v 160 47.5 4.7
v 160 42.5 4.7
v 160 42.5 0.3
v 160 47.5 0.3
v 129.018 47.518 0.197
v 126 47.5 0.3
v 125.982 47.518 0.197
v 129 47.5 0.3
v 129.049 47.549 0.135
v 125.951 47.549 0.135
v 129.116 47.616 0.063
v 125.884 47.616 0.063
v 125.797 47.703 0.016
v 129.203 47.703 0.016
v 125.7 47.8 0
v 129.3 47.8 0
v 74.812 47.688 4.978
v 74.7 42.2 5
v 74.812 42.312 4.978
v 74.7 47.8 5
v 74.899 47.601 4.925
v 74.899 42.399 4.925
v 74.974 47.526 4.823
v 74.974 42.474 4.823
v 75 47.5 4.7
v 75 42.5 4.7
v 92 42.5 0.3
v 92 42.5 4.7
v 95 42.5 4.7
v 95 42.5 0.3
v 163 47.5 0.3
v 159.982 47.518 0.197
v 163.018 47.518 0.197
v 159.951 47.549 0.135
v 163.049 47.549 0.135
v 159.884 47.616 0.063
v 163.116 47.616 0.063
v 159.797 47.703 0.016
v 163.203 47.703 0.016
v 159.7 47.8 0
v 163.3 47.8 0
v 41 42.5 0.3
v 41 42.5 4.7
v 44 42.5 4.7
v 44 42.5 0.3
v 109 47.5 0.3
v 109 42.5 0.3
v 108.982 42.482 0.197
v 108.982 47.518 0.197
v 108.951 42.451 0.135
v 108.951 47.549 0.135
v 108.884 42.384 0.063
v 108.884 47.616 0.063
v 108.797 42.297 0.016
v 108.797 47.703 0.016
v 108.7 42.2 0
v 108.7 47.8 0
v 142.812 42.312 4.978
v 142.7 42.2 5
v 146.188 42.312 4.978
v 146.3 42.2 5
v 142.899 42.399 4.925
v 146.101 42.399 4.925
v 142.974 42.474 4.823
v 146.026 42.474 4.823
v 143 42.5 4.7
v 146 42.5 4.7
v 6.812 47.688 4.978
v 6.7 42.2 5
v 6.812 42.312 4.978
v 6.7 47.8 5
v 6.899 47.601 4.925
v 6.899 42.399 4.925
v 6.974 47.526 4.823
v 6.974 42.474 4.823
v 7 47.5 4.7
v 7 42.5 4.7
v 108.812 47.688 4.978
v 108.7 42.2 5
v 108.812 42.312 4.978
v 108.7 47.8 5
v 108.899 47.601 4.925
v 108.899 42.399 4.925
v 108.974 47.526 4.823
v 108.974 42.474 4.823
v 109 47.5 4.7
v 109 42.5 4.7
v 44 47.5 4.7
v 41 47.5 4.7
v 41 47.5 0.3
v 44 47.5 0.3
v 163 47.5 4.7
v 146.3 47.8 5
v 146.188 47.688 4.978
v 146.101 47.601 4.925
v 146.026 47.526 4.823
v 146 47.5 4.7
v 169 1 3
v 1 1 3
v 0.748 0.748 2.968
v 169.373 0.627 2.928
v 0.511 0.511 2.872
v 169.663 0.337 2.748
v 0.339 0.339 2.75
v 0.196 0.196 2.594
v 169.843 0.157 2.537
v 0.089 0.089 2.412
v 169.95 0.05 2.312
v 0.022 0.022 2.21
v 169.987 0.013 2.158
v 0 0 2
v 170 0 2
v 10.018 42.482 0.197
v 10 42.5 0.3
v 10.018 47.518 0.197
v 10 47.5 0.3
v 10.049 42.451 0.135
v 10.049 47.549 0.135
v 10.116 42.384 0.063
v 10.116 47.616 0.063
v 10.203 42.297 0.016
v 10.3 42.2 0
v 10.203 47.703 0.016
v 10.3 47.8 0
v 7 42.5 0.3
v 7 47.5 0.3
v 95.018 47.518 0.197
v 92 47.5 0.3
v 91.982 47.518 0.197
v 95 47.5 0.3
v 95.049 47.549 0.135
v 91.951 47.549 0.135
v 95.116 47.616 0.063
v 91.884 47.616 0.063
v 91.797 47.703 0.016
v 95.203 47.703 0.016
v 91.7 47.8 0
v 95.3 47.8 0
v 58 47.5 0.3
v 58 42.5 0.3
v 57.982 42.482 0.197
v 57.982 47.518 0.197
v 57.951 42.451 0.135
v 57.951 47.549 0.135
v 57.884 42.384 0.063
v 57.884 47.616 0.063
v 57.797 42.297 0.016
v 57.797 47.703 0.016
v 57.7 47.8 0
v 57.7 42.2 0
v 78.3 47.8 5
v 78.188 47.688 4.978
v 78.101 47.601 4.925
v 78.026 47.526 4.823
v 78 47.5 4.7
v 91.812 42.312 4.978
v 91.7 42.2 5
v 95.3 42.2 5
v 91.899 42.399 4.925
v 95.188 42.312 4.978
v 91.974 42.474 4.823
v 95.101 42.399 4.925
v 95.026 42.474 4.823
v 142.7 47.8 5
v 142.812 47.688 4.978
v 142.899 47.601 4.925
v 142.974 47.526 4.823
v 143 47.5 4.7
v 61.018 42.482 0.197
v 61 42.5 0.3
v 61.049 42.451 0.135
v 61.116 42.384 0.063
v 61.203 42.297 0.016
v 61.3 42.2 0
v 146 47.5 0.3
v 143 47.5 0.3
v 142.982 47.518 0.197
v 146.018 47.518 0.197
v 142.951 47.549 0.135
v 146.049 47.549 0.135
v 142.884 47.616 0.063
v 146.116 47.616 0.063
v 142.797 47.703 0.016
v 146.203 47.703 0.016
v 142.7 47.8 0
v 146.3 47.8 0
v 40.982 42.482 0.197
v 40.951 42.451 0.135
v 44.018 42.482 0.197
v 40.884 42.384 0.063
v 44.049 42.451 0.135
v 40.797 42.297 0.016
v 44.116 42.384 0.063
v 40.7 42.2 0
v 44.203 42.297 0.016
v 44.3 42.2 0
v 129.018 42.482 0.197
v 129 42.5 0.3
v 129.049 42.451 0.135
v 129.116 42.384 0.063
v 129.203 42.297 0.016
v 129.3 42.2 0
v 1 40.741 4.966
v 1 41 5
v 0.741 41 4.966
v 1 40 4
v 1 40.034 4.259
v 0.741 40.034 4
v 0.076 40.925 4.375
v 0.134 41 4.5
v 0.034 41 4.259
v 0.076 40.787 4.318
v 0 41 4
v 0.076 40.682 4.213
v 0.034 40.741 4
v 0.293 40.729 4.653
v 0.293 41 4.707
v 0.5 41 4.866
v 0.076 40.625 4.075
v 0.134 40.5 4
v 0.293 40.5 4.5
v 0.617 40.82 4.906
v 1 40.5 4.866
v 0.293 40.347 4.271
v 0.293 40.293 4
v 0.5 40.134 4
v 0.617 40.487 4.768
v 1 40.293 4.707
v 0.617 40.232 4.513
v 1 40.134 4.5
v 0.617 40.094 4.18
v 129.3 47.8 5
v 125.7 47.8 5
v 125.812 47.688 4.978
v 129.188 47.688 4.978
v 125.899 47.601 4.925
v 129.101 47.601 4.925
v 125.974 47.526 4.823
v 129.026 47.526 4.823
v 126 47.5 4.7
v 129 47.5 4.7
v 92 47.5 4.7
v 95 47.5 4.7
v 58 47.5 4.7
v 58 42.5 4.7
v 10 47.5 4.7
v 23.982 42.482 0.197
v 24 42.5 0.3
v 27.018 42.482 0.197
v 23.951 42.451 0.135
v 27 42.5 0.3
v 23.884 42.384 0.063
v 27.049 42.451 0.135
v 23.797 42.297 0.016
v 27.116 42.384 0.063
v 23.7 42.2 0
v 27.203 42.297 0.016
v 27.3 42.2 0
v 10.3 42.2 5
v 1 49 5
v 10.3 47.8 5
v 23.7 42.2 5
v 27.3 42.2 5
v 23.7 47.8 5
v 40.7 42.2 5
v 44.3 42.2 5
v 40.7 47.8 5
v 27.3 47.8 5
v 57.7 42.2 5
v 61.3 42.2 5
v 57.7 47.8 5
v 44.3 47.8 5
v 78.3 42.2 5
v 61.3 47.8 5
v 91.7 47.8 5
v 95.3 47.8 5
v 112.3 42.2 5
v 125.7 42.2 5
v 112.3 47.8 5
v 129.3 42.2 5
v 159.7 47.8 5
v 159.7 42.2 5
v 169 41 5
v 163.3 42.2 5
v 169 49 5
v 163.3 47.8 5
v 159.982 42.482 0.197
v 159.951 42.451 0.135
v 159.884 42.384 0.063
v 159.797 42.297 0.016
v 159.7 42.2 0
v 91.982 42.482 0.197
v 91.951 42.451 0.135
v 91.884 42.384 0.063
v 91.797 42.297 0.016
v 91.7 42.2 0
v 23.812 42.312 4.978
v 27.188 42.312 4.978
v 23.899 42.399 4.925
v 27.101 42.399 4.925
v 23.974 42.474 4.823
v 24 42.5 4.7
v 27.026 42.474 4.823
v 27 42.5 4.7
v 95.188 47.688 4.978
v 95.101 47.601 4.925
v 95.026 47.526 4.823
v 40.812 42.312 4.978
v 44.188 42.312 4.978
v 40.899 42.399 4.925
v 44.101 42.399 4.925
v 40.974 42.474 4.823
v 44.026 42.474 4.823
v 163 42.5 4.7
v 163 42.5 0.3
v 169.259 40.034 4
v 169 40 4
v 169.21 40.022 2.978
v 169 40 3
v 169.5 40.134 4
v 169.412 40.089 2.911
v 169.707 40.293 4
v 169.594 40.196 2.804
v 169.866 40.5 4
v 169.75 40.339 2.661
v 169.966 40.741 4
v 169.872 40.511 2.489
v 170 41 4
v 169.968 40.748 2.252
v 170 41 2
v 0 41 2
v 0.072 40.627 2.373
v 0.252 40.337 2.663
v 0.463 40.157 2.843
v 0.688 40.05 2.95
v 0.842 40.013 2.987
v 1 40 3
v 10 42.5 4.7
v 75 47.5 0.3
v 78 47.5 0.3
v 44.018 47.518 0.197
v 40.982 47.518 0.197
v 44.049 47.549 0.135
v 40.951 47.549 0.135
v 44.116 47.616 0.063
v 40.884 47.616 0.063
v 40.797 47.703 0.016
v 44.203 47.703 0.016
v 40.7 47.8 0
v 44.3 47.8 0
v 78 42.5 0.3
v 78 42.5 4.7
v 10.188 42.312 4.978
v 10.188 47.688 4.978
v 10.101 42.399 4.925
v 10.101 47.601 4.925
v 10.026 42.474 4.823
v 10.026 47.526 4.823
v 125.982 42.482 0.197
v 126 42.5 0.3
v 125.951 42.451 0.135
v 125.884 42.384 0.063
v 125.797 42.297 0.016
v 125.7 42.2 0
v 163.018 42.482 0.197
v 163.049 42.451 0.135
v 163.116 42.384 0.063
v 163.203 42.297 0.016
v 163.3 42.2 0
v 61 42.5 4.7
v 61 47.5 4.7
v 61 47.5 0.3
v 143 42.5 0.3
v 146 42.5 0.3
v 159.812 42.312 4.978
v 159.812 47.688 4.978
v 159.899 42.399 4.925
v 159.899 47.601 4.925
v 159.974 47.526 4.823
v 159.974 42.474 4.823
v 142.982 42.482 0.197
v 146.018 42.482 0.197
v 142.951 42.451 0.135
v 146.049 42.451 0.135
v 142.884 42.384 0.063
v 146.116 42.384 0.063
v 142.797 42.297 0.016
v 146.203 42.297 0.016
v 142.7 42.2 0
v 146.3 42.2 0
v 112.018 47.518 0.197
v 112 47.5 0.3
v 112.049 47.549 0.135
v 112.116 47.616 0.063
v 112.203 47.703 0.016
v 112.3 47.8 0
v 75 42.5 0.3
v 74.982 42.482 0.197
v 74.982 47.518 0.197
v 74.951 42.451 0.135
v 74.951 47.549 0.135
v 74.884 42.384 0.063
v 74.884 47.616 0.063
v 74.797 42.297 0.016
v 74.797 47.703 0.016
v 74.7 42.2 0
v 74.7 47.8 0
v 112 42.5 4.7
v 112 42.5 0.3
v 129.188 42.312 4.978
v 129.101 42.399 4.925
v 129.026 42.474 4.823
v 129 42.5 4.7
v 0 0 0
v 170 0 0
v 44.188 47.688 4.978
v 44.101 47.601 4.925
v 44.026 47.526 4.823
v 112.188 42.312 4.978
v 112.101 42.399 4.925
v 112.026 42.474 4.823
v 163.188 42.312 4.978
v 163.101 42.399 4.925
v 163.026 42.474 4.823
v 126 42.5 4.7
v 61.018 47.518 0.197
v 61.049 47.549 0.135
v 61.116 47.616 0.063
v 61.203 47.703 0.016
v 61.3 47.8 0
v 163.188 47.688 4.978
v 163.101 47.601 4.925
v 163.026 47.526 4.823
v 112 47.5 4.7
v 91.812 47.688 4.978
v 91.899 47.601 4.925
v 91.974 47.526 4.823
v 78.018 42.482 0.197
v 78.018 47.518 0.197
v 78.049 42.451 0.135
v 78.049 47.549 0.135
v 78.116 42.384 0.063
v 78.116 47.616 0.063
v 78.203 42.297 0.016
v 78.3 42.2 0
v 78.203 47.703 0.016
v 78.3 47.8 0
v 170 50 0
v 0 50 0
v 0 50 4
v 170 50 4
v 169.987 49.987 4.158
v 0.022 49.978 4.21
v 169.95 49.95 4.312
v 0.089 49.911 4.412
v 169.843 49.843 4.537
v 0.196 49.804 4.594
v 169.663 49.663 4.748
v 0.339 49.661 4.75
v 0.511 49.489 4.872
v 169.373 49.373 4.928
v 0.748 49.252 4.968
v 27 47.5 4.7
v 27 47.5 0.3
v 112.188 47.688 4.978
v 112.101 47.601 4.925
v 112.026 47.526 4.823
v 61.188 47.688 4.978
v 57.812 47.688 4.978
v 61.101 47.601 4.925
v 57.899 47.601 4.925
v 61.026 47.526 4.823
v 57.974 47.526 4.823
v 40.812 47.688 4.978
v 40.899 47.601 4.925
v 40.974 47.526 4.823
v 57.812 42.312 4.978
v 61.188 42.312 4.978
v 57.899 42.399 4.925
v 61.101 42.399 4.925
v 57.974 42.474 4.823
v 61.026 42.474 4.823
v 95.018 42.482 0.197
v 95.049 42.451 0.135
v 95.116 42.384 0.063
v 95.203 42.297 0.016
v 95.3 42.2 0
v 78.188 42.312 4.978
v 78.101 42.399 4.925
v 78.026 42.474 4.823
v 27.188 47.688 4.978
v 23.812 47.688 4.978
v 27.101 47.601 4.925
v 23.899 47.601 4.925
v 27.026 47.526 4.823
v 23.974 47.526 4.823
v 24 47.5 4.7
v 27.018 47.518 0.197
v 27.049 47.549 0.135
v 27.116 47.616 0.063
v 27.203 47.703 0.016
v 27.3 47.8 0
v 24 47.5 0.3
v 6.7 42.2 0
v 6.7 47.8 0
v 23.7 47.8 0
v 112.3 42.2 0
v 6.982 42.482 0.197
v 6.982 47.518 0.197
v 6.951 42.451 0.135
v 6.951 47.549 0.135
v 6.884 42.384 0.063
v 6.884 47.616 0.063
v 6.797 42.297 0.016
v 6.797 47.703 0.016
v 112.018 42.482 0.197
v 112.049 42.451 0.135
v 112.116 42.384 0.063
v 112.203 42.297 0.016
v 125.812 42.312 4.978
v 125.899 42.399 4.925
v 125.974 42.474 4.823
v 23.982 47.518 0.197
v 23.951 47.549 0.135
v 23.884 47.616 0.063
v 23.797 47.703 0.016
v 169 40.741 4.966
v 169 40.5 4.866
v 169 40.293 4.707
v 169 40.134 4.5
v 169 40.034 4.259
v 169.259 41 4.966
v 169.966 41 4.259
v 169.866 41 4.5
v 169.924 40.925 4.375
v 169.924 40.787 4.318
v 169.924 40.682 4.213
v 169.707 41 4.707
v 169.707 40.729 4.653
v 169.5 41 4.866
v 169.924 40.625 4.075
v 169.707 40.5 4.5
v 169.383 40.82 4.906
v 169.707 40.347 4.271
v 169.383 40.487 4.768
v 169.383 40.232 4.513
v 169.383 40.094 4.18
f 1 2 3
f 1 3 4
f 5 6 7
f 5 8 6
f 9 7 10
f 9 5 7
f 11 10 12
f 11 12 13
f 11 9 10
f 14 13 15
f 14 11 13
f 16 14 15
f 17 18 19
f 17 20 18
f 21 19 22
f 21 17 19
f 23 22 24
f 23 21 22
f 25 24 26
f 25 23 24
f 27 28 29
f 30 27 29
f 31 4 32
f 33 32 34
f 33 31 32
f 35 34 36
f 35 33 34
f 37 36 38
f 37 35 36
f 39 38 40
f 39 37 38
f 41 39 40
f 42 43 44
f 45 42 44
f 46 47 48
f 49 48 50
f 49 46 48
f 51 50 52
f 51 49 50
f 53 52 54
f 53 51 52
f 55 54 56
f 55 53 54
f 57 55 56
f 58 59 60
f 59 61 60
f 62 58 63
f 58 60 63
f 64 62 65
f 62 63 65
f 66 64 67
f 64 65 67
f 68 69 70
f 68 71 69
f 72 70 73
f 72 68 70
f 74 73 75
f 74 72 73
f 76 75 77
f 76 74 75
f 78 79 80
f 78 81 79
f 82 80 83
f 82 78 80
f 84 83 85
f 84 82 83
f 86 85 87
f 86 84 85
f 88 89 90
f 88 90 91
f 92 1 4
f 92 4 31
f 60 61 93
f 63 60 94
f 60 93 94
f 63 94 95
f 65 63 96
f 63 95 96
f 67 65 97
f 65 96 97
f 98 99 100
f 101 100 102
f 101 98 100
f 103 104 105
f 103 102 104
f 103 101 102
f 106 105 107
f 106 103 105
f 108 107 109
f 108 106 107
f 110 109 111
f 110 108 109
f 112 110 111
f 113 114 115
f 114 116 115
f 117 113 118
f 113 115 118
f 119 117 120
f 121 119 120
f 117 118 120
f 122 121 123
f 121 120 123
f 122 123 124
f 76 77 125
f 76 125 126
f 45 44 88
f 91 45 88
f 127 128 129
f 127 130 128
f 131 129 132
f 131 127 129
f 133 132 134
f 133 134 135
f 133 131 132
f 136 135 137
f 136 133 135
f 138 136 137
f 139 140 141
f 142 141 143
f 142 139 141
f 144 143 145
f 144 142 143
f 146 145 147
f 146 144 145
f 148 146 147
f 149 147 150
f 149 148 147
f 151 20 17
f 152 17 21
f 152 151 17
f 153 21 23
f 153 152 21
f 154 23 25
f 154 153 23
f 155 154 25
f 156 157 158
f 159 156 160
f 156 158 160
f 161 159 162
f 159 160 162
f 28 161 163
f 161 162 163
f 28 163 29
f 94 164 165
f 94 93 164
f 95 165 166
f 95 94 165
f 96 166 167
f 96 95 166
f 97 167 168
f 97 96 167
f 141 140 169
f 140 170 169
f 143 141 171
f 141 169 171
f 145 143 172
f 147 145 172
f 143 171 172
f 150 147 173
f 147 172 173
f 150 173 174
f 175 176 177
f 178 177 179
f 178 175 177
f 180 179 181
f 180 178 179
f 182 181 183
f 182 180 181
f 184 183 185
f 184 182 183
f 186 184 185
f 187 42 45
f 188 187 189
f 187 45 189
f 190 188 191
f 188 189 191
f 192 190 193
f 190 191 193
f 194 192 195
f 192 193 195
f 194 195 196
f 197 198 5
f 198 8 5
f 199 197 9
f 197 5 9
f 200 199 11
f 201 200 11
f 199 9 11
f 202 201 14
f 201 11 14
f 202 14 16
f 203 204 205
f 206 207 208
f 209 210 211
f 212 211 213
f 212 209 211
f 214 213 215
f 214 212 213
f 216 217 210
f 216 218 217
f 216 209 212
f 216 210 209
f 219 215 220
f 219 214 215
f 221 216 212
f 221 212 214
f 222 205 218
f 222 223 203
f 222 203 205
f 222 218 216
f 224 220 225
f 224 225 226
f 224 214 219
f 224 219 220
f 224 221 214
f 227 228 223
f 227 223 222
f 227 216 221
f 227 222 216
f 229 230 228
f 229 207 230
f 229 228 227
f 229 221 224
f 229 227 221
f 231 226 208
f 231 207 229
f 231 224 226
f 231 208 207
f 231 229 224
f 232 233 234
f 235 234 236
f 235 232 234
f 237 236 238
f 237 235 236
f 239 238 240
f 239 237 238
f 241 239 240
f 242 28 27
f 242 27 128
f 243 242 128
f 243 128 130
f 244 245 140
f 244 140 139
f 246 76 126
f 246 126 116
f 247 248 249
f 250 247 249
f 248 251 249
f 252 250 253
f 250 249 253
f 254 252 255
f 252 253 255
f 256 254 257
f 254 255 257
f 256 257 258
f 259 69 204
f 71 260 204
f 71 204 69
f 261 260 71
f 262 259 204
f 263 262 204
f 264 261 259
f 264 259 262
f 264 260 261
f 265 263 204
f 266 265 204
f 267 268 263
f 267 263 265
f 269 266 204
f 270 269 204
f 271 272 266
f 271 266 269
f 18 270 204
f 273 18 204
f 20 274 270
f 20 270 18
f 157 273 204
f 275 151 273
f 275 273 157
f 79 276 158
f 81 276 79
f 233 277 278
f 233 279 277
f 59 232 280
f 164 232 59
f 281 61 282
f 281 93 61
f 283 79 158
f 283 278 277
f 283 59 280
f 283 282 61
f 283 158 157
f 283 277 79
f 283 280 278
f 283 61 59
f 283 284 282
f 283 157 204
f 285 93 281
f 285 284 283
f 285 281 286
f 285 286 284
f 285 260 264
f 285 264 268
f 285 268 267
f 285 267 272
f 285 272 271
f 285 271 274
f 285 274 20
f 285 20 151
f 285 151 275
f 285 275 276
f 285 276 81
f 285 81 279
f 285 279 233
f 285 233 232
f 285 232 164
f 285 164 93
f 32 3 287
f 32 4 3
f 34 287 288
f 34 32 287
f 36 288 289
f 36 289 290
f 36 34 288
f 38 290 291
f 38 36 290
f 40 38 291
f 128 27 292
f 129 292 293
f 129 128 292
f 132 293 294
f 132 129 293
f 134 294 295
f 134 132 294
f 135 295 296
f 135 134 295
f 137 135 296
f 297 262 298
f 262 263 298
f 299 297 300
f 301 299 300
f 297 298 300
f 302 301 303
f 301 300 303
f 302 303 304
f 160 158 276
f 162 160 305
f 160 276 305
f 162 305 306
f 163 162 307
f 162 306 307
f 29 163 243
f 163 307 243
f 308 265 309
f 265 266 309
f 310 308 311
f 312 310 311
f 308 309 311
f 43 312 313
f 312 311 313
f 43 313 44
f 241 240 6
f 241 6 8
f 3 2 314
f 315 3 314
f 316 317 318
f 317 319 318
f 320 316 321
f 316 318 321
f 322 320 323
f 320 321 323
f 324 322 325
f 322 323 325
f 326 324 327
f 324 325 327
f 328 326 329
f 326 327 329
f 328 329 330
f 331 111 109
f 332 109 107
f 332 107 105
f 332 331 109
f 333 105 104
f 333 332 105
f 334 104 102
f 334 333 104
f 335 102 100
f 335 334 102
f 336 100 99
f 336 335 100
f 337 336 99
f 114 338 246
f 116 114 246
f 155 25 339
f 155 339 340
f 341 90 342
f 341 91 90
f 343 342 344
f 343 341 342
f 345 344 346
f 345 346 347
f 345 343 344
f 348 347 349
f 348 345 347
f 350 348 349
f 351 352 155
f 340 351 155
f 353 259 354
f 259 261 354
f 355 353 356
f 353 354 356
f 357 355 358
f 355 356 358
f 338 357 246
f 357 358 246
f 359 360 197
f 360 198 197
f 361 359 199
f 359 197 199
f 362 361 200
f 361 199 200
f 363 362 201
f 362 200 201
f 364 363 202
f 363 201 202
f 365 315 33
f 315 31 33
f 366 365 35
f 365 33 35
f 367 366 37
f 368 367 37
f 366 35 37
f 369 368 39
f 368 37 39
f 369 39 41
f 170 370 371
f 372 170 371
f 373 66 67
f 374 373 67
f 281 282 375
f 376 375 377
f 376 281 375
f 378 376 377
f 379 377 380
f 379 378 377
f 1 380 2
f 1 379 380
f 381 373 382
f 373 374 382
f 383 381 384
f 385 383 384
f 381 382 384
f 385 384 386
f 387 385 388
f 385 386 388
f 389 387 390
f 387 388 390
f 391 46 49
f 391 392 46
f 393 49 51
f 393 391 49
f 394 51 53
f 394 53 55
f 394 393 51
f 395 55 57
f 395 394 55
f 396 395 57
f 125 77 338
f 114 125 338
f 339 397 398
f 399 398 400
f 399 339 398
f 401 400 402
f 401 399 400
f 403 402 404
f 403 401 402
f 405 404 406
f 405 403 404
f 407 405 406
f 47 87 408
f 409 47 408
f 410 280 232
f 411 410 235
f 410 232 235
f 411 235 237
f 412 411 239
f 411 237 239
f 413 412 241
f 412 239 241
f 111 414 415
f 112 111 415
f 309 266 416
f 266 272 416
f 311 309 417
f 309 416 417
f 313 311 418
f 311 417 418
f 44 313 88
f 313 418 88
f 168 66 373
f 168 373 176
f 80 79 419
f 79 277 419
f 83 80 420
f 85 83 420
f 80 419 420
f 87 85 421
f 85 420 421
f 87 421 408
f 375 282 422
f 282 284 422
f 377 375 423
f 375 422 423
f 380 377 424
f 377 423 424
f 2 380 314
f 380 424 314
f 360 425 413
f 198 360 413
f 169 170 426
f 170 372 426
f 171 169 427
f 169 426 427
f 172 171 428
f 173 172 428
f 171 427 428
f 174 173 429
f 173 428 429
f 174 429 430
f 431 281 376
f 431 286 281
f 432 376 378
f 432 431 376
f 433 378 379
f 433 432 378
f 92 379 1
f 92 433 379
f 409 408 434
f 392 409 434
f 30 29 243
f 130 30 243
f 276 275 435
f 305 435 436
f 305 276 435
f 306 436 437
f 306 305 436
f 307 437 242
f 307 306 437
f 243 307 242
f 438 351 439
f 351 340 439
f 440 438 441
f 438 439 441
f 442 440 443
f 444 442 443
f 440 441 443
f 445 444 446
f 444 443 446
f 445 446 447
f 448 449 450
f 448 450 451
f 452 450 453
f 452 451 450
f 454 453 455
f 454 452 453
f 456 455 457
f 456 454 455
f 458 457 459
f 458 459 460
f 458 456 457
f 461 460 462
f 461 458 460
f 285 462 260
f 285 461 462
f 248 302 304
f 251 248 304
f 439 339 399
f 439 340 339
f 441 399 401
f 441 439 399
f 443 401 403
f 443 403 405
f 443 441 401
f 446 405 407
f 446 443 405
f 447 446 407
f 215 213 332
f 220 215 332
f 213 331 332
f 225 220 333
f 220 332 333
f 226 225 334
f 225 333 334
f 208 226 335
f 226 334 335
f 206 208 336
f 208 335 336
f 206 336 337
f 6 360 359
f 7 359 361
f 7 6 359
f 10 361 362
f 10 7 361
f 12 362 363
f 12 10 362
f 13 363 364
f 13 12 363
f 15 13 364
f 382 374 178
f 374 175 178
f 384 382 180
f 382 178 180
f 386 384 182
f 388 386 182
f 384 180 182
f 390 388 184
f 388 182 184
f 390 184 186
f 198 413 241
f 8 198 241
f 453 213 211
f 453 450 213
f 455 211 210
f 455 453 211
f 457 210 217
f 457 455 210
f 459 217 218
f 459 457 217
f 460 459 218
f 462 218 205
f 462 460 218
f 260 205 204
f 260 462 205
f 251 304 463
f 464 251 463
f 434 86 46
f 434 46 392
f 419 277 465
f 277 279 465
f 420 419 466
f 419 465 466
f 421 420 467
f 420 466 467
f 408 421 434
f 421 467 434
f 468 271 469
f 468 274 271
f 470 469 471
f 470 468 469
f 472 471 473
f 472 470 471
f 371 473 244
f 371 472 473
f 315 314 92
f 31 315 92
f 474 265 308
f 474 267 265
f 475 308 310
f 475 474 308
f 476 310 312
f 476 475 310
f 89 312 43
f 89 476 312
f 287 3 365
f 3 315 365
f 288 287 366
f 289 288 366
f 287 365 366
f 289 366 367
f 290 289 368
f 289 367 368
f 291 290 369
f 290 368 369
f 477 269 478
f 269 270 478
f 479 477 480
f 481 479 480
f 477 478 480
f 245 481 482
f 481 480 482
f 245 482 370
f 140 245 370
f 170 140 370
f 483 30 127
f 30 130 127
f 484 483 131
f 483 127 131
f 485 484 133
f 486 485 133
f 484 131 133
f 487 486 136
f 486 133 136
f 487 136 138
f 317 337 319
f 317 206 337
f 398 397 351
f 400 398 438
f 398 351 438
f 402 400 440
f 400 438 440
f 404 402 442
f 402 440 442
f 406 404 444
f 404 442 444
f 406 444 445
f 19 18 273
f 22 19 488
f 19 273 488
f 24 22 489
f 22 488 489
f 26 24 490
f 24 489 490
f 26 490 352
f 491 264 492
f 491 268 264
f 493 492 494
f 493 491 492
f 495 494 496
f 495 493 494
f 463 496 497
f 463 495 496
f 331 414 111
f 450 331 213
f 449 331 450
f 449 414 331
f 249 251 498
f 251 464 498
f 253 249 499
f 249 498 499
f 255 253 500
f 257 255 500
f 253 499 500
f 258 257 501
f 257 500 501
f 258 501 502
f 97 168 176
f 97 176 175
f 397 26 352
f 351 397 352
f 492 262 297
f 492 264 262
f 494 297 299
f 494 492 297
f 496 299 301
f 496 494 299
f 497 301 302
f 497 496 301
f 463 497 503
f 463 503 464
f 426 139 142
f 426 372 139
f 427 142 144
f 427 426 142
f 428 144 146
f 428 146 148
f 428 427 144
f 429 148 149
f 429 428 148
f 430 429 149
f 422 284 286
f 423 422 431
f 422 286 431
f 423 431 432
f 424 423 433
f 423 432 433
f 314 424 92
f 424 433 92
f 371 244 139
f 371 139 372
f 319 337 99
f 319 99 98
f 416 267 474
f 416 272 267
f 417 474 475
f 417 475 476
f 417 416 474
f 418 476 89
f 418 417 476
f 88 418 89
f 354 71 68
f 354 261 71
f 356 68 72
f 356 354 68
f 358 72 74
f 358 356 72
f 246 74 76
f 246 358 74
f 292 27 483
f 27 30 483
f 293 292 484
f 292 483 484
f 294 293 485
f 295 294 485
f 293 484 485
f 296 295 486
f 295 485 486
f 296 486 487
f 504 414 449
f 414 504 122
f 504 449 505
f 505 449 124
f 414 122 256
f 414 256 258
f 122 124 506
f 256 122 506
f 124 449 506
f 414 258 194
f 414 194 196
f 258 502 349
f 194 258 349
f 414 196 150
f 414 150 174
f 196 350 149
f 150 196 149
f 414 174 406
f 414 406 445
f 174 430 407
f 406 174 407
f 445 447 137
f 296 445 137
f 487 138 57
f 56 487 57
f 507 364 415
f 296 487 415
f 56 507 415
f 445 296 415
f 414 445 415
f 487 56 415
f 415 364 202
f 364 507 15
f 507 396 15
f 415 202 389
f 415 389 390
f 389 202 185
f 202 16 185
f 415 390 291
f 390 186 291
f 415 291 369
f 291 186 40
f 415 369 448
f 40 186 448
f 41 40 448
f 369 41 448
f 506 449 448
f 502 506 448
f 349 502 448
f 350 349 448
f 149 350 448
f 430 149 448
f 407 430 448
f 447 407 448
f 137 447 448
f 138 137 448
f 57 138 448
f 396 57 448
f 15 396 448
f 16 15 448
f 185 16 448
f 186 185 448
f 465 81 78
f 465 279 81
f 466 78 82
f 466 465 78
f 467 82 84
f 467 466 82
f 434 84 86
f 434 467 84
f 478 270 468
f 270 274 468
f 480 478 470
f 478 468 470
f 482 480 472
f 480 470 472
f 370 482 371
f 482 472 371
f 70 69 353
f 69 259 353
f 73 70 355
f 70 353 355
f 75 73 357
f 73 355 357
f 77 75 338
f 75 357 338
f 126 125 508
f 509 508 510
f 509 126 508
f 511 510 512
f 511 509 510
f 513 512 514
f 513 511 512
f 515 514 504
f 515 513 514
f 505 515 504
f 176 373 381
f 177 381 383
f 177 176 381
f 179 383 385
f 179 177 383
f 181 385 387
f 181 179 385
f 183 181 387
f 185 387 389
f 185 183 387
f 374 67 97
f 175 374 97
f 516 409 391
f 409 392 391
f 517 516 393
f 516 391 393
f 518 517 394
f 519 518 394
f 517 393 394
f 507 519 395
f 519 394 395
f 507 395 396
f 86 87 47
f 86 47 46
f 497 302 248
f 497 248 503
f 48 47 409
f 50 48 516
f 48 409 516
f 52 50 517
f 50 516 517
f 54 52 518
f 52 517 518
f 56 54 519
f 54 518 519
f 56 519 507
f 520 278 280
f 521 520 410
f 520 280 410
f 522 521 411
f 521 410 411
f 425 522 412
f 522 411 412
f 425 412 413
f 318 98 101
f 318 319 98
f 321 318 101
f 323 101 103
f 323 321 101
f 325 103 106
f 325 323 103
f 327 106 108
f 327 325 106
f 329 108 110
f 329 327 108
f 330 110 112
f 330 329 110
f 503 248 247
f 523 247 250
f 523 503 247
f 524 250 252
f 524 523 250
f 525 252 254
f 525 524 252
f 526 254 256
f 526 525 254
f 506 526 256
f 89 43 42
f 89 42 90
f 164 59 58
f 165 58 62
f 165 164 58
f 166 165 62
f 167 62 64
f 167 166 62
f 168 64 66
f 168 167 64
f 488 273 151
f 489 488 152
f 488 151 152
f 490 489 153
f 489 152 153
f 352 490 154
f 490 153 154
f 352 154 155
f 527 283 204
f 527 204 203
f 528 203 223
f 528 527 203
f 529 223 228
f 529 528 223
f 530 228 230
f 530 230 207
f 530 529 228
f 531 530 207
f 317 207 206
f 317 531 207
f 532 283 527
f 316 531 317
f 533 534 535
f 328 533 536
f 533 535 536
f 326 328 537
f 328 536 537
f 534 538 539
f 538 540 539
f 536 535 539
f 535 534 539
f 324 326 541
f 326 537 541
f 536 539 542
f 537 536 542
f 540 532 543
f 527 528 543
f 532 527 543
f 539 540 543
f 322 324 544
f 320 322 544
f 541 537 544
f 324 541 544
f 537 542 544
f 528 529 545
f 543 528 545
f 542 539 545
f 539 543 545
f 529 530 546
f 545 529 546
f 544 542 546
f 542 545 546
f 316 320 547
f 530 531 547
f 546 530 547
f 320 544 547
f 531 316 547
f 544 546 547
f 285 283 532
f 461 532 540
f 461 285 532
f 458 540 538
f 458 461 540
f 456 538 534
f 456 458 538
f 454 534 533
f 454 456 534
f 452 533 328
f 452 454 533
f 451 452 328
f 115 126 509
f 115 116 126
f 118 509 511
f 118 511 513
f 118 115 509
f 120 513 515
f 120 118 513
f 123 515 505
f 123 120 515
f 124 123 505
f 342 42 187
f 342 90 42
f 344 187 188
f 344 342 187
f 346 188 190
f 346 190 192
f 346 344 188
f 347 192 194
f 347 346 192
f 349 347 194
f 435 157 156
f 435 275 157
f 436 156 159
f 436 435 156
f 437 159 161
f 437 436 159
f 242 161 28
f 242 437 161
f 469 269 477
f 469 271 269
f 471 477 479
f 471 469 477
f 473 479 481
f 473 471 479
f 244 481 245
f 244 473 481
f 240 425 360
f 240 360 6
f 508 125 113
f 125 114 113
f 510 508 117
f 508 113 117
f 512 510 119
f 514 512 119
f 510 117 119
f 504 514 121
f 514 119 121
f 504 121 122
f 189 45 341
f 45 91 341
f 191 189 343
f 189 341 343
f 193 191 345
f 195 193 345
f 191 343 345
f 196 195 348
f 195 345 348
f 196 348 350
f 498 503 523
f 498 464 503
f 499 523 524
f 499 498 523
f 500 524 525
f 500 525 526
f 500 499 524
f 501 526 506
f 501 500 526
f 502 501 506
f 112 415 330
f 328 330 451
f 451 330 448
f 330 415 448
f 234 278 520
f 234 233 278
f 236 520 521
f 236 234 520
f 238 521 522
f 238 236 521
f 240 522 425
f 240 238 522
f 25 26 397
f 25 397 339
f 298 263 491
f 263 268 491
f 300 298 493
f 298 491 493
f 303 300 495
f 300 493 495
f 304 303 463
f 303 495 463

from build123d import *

# Parameters (mm, degrees)
SKETCH_W        = 170
SKETCH_H        = 50
PAD_DEPTH       = 5
SKETCH001_W     = 170
SKETCH001_H     = 40
POCKET_DEPTH    = 2
FILLET_R        = 1
SKETCH002_W     = 3
SKETCH002_H     = 5
POCKET001_DEPTH = 5.001
FILLET001_R     = 0.3
FILLET002_R     = 0.3


with BuildPart() as part:
    # Sketch → Pad (new body)
    with BuildSketch(Plane.XY):
        with Locations((85, 25)):
            Rectangle(SKETCH_W, SKETCH_H)
    extrude(amount=PAD_DEPTH)

    # Sketch001 (on Face6 of Pad) → Pocket (cut)
    with BuildSketch(Plane.XY.offset(5)):
        with Locations((85, 20)):
            Rectangle(SKETCH001_W, SKETCH001_H)
    extrude(amount=-POCKET_DEPTH, mode=Mode.SUBTRACT)

    # Fillet
    fillet_edges = [part.edges().sort_by_distance(p)[0] for p in [
        (0, 20, 3),
        (85, 0, 3),
        (170, 20, 3),
        (85, 40, 5),
        (170, 45, 5),
        (85, 50, 5),
        (0, 45, 5),
        (0, 40, 4),
        (170, 40, 4),
    ]]
    fillet(fillet_edges, radius=FILLET_R)

    # Sketch002 (on Face10 of Fillet) → Pocket001 (cut, through all)
    with BuildSketch(Plane.XY.offset(5)):
        with Locations((8.5, 45)):
            Rectangle(SKETCH002_W, SKETCH002_H)
        with Locations((25.5, 45)):
            Rectangle(SKETCH002_W, SKETCH002_H)
        with Locations((42.5, 45)):
            Rectangle(SKETCH002_W, SKETCH002_H)
        with Locations((161.5, 45)):
            Rectangle(SKETCH002_W, SKETCH002_H)
        with Locations((59.5, 45)):
            Rectangle(SKETCH002_W, SKETCH002_H)
        with Locations((76.5, 45)):
            Rectangle(SKETCH002_W, SKETCH002_H)
        with Locations((93.5, 45)):
            Rectangle(SKETCH002_W, SKETCH002_H)
        with Locations((110.5, 45)):
            Rectangle(SKETCH002_W, SKETCH002_H)
        with Locations((127.5, 45)):
            Rectangle(SKETCH002_W, SKETCH002_H)
        with Locations((144.5, 45)):
            Rectangle(SKETCH002_W, SKETCH002_H)
    extrude(amount=-POCKET001_DEPTH, mode=Mode.SUBTRACT)

    # Fillet001
    fillet001_edges = [part.edges().sort_by_distance(p)[0] for p in [
        (10, 45, 5),
        (8.5, 42.5, 5),
        (7, 45, 5),
        (8.5, 47.5, 5),
        (25.5, 47.5, 5),
        (24, 45, 5),
        (25.5, 42.5, 5),
        (27, 45, 5),
        (41, 45, 5),
        (42.5, 47.5, 5),
        (44, 45, 5),
        (42.5, 42.5, 5),
        (59.5, 47.5, 5),
        (58, 45, 5),
        (61, 45, 5),
        (59.5, 42.5, 5),
        (76.5, 47.5, 5),
        (75, 45, 5),
        (76.5, 42.5, 5),
        (78, 45, 5),
        (92, 45, 5),
        (93.5, 47.5, 5),
        (95, 45, 5),
        (93.5, 42.5, 5),
        (110.5, 47.5, 5),
        (109, 45, 5),
        (112, 45, 5),
        (110.5, 42.5, 5),
        (127.5, 47.5, 5),
        (126, 45, 5),
        (129, 45, 5),
        (127.5, 42.5, 5),
        (143, 45, 5),
        (144.5, 47.5, 5),
        (146, 45, 5),
        (144.5, 42.5, 5),
        (161.5, 47.5, 5),
        (160, 45, 5),
        (163, 45, 5),
        (161.5, 42.5, 5),
    ]]
    fillet(fillet001_edges, radius=FILLET001_R)

    # Fillet002
    fillet002_edges = [part.edges().sort_by_distance(p)[0] for p in [
        (7, 45, 0),
        (8.5, 42.5, 0),
        (10, 45, 0),
        (8.5, 47.5, 0),
        (25.5, 42.5, 0),
        (24, 45, 0),
        (25.5, 47.5, 0),
        (27, 45, 0),
        (42.5, 42.5, 0),
        (41, 45, 0),
        (44, 45, 0),
        (42.5, 47.5, 0),
        (58, 45, 0),
        (59.5, 42.5, 0),
        (61, 45, 0),
        (59.5, 47.5, 0),
        (76.5, 42.5, 0),
        (75, 45, 0),
        (76.5, 47.5, 0),
        (78, 45, 0),
        (92, 45, 0),
        (93.5, 42.5, 0),
        (95, 45, 0),
        (93.5, 47.5, 0),
        (110.5, 42.5, 0),
        (109, 45, 0),
        (110.5, 47.5, 0),
        (112, 45, 0),
        (127.5, 42.5, 0),
        (126, 45, 0),
        (127.5, 47.5, 0),
        (129, 45, 0),
        (143, 45, 0),
        (144.5, 42.5, 0),
        (146, 45, 0),
        (144.5, 47.5, 0),
        (161.5, 42.5, 0),
        (160, 45, 0),
        (163, 45, 0),
        (161.5, 47.5, 0),
    ]]
    fillet(fillet002_edges, radius=FILLET002_R)


solid = part.part
